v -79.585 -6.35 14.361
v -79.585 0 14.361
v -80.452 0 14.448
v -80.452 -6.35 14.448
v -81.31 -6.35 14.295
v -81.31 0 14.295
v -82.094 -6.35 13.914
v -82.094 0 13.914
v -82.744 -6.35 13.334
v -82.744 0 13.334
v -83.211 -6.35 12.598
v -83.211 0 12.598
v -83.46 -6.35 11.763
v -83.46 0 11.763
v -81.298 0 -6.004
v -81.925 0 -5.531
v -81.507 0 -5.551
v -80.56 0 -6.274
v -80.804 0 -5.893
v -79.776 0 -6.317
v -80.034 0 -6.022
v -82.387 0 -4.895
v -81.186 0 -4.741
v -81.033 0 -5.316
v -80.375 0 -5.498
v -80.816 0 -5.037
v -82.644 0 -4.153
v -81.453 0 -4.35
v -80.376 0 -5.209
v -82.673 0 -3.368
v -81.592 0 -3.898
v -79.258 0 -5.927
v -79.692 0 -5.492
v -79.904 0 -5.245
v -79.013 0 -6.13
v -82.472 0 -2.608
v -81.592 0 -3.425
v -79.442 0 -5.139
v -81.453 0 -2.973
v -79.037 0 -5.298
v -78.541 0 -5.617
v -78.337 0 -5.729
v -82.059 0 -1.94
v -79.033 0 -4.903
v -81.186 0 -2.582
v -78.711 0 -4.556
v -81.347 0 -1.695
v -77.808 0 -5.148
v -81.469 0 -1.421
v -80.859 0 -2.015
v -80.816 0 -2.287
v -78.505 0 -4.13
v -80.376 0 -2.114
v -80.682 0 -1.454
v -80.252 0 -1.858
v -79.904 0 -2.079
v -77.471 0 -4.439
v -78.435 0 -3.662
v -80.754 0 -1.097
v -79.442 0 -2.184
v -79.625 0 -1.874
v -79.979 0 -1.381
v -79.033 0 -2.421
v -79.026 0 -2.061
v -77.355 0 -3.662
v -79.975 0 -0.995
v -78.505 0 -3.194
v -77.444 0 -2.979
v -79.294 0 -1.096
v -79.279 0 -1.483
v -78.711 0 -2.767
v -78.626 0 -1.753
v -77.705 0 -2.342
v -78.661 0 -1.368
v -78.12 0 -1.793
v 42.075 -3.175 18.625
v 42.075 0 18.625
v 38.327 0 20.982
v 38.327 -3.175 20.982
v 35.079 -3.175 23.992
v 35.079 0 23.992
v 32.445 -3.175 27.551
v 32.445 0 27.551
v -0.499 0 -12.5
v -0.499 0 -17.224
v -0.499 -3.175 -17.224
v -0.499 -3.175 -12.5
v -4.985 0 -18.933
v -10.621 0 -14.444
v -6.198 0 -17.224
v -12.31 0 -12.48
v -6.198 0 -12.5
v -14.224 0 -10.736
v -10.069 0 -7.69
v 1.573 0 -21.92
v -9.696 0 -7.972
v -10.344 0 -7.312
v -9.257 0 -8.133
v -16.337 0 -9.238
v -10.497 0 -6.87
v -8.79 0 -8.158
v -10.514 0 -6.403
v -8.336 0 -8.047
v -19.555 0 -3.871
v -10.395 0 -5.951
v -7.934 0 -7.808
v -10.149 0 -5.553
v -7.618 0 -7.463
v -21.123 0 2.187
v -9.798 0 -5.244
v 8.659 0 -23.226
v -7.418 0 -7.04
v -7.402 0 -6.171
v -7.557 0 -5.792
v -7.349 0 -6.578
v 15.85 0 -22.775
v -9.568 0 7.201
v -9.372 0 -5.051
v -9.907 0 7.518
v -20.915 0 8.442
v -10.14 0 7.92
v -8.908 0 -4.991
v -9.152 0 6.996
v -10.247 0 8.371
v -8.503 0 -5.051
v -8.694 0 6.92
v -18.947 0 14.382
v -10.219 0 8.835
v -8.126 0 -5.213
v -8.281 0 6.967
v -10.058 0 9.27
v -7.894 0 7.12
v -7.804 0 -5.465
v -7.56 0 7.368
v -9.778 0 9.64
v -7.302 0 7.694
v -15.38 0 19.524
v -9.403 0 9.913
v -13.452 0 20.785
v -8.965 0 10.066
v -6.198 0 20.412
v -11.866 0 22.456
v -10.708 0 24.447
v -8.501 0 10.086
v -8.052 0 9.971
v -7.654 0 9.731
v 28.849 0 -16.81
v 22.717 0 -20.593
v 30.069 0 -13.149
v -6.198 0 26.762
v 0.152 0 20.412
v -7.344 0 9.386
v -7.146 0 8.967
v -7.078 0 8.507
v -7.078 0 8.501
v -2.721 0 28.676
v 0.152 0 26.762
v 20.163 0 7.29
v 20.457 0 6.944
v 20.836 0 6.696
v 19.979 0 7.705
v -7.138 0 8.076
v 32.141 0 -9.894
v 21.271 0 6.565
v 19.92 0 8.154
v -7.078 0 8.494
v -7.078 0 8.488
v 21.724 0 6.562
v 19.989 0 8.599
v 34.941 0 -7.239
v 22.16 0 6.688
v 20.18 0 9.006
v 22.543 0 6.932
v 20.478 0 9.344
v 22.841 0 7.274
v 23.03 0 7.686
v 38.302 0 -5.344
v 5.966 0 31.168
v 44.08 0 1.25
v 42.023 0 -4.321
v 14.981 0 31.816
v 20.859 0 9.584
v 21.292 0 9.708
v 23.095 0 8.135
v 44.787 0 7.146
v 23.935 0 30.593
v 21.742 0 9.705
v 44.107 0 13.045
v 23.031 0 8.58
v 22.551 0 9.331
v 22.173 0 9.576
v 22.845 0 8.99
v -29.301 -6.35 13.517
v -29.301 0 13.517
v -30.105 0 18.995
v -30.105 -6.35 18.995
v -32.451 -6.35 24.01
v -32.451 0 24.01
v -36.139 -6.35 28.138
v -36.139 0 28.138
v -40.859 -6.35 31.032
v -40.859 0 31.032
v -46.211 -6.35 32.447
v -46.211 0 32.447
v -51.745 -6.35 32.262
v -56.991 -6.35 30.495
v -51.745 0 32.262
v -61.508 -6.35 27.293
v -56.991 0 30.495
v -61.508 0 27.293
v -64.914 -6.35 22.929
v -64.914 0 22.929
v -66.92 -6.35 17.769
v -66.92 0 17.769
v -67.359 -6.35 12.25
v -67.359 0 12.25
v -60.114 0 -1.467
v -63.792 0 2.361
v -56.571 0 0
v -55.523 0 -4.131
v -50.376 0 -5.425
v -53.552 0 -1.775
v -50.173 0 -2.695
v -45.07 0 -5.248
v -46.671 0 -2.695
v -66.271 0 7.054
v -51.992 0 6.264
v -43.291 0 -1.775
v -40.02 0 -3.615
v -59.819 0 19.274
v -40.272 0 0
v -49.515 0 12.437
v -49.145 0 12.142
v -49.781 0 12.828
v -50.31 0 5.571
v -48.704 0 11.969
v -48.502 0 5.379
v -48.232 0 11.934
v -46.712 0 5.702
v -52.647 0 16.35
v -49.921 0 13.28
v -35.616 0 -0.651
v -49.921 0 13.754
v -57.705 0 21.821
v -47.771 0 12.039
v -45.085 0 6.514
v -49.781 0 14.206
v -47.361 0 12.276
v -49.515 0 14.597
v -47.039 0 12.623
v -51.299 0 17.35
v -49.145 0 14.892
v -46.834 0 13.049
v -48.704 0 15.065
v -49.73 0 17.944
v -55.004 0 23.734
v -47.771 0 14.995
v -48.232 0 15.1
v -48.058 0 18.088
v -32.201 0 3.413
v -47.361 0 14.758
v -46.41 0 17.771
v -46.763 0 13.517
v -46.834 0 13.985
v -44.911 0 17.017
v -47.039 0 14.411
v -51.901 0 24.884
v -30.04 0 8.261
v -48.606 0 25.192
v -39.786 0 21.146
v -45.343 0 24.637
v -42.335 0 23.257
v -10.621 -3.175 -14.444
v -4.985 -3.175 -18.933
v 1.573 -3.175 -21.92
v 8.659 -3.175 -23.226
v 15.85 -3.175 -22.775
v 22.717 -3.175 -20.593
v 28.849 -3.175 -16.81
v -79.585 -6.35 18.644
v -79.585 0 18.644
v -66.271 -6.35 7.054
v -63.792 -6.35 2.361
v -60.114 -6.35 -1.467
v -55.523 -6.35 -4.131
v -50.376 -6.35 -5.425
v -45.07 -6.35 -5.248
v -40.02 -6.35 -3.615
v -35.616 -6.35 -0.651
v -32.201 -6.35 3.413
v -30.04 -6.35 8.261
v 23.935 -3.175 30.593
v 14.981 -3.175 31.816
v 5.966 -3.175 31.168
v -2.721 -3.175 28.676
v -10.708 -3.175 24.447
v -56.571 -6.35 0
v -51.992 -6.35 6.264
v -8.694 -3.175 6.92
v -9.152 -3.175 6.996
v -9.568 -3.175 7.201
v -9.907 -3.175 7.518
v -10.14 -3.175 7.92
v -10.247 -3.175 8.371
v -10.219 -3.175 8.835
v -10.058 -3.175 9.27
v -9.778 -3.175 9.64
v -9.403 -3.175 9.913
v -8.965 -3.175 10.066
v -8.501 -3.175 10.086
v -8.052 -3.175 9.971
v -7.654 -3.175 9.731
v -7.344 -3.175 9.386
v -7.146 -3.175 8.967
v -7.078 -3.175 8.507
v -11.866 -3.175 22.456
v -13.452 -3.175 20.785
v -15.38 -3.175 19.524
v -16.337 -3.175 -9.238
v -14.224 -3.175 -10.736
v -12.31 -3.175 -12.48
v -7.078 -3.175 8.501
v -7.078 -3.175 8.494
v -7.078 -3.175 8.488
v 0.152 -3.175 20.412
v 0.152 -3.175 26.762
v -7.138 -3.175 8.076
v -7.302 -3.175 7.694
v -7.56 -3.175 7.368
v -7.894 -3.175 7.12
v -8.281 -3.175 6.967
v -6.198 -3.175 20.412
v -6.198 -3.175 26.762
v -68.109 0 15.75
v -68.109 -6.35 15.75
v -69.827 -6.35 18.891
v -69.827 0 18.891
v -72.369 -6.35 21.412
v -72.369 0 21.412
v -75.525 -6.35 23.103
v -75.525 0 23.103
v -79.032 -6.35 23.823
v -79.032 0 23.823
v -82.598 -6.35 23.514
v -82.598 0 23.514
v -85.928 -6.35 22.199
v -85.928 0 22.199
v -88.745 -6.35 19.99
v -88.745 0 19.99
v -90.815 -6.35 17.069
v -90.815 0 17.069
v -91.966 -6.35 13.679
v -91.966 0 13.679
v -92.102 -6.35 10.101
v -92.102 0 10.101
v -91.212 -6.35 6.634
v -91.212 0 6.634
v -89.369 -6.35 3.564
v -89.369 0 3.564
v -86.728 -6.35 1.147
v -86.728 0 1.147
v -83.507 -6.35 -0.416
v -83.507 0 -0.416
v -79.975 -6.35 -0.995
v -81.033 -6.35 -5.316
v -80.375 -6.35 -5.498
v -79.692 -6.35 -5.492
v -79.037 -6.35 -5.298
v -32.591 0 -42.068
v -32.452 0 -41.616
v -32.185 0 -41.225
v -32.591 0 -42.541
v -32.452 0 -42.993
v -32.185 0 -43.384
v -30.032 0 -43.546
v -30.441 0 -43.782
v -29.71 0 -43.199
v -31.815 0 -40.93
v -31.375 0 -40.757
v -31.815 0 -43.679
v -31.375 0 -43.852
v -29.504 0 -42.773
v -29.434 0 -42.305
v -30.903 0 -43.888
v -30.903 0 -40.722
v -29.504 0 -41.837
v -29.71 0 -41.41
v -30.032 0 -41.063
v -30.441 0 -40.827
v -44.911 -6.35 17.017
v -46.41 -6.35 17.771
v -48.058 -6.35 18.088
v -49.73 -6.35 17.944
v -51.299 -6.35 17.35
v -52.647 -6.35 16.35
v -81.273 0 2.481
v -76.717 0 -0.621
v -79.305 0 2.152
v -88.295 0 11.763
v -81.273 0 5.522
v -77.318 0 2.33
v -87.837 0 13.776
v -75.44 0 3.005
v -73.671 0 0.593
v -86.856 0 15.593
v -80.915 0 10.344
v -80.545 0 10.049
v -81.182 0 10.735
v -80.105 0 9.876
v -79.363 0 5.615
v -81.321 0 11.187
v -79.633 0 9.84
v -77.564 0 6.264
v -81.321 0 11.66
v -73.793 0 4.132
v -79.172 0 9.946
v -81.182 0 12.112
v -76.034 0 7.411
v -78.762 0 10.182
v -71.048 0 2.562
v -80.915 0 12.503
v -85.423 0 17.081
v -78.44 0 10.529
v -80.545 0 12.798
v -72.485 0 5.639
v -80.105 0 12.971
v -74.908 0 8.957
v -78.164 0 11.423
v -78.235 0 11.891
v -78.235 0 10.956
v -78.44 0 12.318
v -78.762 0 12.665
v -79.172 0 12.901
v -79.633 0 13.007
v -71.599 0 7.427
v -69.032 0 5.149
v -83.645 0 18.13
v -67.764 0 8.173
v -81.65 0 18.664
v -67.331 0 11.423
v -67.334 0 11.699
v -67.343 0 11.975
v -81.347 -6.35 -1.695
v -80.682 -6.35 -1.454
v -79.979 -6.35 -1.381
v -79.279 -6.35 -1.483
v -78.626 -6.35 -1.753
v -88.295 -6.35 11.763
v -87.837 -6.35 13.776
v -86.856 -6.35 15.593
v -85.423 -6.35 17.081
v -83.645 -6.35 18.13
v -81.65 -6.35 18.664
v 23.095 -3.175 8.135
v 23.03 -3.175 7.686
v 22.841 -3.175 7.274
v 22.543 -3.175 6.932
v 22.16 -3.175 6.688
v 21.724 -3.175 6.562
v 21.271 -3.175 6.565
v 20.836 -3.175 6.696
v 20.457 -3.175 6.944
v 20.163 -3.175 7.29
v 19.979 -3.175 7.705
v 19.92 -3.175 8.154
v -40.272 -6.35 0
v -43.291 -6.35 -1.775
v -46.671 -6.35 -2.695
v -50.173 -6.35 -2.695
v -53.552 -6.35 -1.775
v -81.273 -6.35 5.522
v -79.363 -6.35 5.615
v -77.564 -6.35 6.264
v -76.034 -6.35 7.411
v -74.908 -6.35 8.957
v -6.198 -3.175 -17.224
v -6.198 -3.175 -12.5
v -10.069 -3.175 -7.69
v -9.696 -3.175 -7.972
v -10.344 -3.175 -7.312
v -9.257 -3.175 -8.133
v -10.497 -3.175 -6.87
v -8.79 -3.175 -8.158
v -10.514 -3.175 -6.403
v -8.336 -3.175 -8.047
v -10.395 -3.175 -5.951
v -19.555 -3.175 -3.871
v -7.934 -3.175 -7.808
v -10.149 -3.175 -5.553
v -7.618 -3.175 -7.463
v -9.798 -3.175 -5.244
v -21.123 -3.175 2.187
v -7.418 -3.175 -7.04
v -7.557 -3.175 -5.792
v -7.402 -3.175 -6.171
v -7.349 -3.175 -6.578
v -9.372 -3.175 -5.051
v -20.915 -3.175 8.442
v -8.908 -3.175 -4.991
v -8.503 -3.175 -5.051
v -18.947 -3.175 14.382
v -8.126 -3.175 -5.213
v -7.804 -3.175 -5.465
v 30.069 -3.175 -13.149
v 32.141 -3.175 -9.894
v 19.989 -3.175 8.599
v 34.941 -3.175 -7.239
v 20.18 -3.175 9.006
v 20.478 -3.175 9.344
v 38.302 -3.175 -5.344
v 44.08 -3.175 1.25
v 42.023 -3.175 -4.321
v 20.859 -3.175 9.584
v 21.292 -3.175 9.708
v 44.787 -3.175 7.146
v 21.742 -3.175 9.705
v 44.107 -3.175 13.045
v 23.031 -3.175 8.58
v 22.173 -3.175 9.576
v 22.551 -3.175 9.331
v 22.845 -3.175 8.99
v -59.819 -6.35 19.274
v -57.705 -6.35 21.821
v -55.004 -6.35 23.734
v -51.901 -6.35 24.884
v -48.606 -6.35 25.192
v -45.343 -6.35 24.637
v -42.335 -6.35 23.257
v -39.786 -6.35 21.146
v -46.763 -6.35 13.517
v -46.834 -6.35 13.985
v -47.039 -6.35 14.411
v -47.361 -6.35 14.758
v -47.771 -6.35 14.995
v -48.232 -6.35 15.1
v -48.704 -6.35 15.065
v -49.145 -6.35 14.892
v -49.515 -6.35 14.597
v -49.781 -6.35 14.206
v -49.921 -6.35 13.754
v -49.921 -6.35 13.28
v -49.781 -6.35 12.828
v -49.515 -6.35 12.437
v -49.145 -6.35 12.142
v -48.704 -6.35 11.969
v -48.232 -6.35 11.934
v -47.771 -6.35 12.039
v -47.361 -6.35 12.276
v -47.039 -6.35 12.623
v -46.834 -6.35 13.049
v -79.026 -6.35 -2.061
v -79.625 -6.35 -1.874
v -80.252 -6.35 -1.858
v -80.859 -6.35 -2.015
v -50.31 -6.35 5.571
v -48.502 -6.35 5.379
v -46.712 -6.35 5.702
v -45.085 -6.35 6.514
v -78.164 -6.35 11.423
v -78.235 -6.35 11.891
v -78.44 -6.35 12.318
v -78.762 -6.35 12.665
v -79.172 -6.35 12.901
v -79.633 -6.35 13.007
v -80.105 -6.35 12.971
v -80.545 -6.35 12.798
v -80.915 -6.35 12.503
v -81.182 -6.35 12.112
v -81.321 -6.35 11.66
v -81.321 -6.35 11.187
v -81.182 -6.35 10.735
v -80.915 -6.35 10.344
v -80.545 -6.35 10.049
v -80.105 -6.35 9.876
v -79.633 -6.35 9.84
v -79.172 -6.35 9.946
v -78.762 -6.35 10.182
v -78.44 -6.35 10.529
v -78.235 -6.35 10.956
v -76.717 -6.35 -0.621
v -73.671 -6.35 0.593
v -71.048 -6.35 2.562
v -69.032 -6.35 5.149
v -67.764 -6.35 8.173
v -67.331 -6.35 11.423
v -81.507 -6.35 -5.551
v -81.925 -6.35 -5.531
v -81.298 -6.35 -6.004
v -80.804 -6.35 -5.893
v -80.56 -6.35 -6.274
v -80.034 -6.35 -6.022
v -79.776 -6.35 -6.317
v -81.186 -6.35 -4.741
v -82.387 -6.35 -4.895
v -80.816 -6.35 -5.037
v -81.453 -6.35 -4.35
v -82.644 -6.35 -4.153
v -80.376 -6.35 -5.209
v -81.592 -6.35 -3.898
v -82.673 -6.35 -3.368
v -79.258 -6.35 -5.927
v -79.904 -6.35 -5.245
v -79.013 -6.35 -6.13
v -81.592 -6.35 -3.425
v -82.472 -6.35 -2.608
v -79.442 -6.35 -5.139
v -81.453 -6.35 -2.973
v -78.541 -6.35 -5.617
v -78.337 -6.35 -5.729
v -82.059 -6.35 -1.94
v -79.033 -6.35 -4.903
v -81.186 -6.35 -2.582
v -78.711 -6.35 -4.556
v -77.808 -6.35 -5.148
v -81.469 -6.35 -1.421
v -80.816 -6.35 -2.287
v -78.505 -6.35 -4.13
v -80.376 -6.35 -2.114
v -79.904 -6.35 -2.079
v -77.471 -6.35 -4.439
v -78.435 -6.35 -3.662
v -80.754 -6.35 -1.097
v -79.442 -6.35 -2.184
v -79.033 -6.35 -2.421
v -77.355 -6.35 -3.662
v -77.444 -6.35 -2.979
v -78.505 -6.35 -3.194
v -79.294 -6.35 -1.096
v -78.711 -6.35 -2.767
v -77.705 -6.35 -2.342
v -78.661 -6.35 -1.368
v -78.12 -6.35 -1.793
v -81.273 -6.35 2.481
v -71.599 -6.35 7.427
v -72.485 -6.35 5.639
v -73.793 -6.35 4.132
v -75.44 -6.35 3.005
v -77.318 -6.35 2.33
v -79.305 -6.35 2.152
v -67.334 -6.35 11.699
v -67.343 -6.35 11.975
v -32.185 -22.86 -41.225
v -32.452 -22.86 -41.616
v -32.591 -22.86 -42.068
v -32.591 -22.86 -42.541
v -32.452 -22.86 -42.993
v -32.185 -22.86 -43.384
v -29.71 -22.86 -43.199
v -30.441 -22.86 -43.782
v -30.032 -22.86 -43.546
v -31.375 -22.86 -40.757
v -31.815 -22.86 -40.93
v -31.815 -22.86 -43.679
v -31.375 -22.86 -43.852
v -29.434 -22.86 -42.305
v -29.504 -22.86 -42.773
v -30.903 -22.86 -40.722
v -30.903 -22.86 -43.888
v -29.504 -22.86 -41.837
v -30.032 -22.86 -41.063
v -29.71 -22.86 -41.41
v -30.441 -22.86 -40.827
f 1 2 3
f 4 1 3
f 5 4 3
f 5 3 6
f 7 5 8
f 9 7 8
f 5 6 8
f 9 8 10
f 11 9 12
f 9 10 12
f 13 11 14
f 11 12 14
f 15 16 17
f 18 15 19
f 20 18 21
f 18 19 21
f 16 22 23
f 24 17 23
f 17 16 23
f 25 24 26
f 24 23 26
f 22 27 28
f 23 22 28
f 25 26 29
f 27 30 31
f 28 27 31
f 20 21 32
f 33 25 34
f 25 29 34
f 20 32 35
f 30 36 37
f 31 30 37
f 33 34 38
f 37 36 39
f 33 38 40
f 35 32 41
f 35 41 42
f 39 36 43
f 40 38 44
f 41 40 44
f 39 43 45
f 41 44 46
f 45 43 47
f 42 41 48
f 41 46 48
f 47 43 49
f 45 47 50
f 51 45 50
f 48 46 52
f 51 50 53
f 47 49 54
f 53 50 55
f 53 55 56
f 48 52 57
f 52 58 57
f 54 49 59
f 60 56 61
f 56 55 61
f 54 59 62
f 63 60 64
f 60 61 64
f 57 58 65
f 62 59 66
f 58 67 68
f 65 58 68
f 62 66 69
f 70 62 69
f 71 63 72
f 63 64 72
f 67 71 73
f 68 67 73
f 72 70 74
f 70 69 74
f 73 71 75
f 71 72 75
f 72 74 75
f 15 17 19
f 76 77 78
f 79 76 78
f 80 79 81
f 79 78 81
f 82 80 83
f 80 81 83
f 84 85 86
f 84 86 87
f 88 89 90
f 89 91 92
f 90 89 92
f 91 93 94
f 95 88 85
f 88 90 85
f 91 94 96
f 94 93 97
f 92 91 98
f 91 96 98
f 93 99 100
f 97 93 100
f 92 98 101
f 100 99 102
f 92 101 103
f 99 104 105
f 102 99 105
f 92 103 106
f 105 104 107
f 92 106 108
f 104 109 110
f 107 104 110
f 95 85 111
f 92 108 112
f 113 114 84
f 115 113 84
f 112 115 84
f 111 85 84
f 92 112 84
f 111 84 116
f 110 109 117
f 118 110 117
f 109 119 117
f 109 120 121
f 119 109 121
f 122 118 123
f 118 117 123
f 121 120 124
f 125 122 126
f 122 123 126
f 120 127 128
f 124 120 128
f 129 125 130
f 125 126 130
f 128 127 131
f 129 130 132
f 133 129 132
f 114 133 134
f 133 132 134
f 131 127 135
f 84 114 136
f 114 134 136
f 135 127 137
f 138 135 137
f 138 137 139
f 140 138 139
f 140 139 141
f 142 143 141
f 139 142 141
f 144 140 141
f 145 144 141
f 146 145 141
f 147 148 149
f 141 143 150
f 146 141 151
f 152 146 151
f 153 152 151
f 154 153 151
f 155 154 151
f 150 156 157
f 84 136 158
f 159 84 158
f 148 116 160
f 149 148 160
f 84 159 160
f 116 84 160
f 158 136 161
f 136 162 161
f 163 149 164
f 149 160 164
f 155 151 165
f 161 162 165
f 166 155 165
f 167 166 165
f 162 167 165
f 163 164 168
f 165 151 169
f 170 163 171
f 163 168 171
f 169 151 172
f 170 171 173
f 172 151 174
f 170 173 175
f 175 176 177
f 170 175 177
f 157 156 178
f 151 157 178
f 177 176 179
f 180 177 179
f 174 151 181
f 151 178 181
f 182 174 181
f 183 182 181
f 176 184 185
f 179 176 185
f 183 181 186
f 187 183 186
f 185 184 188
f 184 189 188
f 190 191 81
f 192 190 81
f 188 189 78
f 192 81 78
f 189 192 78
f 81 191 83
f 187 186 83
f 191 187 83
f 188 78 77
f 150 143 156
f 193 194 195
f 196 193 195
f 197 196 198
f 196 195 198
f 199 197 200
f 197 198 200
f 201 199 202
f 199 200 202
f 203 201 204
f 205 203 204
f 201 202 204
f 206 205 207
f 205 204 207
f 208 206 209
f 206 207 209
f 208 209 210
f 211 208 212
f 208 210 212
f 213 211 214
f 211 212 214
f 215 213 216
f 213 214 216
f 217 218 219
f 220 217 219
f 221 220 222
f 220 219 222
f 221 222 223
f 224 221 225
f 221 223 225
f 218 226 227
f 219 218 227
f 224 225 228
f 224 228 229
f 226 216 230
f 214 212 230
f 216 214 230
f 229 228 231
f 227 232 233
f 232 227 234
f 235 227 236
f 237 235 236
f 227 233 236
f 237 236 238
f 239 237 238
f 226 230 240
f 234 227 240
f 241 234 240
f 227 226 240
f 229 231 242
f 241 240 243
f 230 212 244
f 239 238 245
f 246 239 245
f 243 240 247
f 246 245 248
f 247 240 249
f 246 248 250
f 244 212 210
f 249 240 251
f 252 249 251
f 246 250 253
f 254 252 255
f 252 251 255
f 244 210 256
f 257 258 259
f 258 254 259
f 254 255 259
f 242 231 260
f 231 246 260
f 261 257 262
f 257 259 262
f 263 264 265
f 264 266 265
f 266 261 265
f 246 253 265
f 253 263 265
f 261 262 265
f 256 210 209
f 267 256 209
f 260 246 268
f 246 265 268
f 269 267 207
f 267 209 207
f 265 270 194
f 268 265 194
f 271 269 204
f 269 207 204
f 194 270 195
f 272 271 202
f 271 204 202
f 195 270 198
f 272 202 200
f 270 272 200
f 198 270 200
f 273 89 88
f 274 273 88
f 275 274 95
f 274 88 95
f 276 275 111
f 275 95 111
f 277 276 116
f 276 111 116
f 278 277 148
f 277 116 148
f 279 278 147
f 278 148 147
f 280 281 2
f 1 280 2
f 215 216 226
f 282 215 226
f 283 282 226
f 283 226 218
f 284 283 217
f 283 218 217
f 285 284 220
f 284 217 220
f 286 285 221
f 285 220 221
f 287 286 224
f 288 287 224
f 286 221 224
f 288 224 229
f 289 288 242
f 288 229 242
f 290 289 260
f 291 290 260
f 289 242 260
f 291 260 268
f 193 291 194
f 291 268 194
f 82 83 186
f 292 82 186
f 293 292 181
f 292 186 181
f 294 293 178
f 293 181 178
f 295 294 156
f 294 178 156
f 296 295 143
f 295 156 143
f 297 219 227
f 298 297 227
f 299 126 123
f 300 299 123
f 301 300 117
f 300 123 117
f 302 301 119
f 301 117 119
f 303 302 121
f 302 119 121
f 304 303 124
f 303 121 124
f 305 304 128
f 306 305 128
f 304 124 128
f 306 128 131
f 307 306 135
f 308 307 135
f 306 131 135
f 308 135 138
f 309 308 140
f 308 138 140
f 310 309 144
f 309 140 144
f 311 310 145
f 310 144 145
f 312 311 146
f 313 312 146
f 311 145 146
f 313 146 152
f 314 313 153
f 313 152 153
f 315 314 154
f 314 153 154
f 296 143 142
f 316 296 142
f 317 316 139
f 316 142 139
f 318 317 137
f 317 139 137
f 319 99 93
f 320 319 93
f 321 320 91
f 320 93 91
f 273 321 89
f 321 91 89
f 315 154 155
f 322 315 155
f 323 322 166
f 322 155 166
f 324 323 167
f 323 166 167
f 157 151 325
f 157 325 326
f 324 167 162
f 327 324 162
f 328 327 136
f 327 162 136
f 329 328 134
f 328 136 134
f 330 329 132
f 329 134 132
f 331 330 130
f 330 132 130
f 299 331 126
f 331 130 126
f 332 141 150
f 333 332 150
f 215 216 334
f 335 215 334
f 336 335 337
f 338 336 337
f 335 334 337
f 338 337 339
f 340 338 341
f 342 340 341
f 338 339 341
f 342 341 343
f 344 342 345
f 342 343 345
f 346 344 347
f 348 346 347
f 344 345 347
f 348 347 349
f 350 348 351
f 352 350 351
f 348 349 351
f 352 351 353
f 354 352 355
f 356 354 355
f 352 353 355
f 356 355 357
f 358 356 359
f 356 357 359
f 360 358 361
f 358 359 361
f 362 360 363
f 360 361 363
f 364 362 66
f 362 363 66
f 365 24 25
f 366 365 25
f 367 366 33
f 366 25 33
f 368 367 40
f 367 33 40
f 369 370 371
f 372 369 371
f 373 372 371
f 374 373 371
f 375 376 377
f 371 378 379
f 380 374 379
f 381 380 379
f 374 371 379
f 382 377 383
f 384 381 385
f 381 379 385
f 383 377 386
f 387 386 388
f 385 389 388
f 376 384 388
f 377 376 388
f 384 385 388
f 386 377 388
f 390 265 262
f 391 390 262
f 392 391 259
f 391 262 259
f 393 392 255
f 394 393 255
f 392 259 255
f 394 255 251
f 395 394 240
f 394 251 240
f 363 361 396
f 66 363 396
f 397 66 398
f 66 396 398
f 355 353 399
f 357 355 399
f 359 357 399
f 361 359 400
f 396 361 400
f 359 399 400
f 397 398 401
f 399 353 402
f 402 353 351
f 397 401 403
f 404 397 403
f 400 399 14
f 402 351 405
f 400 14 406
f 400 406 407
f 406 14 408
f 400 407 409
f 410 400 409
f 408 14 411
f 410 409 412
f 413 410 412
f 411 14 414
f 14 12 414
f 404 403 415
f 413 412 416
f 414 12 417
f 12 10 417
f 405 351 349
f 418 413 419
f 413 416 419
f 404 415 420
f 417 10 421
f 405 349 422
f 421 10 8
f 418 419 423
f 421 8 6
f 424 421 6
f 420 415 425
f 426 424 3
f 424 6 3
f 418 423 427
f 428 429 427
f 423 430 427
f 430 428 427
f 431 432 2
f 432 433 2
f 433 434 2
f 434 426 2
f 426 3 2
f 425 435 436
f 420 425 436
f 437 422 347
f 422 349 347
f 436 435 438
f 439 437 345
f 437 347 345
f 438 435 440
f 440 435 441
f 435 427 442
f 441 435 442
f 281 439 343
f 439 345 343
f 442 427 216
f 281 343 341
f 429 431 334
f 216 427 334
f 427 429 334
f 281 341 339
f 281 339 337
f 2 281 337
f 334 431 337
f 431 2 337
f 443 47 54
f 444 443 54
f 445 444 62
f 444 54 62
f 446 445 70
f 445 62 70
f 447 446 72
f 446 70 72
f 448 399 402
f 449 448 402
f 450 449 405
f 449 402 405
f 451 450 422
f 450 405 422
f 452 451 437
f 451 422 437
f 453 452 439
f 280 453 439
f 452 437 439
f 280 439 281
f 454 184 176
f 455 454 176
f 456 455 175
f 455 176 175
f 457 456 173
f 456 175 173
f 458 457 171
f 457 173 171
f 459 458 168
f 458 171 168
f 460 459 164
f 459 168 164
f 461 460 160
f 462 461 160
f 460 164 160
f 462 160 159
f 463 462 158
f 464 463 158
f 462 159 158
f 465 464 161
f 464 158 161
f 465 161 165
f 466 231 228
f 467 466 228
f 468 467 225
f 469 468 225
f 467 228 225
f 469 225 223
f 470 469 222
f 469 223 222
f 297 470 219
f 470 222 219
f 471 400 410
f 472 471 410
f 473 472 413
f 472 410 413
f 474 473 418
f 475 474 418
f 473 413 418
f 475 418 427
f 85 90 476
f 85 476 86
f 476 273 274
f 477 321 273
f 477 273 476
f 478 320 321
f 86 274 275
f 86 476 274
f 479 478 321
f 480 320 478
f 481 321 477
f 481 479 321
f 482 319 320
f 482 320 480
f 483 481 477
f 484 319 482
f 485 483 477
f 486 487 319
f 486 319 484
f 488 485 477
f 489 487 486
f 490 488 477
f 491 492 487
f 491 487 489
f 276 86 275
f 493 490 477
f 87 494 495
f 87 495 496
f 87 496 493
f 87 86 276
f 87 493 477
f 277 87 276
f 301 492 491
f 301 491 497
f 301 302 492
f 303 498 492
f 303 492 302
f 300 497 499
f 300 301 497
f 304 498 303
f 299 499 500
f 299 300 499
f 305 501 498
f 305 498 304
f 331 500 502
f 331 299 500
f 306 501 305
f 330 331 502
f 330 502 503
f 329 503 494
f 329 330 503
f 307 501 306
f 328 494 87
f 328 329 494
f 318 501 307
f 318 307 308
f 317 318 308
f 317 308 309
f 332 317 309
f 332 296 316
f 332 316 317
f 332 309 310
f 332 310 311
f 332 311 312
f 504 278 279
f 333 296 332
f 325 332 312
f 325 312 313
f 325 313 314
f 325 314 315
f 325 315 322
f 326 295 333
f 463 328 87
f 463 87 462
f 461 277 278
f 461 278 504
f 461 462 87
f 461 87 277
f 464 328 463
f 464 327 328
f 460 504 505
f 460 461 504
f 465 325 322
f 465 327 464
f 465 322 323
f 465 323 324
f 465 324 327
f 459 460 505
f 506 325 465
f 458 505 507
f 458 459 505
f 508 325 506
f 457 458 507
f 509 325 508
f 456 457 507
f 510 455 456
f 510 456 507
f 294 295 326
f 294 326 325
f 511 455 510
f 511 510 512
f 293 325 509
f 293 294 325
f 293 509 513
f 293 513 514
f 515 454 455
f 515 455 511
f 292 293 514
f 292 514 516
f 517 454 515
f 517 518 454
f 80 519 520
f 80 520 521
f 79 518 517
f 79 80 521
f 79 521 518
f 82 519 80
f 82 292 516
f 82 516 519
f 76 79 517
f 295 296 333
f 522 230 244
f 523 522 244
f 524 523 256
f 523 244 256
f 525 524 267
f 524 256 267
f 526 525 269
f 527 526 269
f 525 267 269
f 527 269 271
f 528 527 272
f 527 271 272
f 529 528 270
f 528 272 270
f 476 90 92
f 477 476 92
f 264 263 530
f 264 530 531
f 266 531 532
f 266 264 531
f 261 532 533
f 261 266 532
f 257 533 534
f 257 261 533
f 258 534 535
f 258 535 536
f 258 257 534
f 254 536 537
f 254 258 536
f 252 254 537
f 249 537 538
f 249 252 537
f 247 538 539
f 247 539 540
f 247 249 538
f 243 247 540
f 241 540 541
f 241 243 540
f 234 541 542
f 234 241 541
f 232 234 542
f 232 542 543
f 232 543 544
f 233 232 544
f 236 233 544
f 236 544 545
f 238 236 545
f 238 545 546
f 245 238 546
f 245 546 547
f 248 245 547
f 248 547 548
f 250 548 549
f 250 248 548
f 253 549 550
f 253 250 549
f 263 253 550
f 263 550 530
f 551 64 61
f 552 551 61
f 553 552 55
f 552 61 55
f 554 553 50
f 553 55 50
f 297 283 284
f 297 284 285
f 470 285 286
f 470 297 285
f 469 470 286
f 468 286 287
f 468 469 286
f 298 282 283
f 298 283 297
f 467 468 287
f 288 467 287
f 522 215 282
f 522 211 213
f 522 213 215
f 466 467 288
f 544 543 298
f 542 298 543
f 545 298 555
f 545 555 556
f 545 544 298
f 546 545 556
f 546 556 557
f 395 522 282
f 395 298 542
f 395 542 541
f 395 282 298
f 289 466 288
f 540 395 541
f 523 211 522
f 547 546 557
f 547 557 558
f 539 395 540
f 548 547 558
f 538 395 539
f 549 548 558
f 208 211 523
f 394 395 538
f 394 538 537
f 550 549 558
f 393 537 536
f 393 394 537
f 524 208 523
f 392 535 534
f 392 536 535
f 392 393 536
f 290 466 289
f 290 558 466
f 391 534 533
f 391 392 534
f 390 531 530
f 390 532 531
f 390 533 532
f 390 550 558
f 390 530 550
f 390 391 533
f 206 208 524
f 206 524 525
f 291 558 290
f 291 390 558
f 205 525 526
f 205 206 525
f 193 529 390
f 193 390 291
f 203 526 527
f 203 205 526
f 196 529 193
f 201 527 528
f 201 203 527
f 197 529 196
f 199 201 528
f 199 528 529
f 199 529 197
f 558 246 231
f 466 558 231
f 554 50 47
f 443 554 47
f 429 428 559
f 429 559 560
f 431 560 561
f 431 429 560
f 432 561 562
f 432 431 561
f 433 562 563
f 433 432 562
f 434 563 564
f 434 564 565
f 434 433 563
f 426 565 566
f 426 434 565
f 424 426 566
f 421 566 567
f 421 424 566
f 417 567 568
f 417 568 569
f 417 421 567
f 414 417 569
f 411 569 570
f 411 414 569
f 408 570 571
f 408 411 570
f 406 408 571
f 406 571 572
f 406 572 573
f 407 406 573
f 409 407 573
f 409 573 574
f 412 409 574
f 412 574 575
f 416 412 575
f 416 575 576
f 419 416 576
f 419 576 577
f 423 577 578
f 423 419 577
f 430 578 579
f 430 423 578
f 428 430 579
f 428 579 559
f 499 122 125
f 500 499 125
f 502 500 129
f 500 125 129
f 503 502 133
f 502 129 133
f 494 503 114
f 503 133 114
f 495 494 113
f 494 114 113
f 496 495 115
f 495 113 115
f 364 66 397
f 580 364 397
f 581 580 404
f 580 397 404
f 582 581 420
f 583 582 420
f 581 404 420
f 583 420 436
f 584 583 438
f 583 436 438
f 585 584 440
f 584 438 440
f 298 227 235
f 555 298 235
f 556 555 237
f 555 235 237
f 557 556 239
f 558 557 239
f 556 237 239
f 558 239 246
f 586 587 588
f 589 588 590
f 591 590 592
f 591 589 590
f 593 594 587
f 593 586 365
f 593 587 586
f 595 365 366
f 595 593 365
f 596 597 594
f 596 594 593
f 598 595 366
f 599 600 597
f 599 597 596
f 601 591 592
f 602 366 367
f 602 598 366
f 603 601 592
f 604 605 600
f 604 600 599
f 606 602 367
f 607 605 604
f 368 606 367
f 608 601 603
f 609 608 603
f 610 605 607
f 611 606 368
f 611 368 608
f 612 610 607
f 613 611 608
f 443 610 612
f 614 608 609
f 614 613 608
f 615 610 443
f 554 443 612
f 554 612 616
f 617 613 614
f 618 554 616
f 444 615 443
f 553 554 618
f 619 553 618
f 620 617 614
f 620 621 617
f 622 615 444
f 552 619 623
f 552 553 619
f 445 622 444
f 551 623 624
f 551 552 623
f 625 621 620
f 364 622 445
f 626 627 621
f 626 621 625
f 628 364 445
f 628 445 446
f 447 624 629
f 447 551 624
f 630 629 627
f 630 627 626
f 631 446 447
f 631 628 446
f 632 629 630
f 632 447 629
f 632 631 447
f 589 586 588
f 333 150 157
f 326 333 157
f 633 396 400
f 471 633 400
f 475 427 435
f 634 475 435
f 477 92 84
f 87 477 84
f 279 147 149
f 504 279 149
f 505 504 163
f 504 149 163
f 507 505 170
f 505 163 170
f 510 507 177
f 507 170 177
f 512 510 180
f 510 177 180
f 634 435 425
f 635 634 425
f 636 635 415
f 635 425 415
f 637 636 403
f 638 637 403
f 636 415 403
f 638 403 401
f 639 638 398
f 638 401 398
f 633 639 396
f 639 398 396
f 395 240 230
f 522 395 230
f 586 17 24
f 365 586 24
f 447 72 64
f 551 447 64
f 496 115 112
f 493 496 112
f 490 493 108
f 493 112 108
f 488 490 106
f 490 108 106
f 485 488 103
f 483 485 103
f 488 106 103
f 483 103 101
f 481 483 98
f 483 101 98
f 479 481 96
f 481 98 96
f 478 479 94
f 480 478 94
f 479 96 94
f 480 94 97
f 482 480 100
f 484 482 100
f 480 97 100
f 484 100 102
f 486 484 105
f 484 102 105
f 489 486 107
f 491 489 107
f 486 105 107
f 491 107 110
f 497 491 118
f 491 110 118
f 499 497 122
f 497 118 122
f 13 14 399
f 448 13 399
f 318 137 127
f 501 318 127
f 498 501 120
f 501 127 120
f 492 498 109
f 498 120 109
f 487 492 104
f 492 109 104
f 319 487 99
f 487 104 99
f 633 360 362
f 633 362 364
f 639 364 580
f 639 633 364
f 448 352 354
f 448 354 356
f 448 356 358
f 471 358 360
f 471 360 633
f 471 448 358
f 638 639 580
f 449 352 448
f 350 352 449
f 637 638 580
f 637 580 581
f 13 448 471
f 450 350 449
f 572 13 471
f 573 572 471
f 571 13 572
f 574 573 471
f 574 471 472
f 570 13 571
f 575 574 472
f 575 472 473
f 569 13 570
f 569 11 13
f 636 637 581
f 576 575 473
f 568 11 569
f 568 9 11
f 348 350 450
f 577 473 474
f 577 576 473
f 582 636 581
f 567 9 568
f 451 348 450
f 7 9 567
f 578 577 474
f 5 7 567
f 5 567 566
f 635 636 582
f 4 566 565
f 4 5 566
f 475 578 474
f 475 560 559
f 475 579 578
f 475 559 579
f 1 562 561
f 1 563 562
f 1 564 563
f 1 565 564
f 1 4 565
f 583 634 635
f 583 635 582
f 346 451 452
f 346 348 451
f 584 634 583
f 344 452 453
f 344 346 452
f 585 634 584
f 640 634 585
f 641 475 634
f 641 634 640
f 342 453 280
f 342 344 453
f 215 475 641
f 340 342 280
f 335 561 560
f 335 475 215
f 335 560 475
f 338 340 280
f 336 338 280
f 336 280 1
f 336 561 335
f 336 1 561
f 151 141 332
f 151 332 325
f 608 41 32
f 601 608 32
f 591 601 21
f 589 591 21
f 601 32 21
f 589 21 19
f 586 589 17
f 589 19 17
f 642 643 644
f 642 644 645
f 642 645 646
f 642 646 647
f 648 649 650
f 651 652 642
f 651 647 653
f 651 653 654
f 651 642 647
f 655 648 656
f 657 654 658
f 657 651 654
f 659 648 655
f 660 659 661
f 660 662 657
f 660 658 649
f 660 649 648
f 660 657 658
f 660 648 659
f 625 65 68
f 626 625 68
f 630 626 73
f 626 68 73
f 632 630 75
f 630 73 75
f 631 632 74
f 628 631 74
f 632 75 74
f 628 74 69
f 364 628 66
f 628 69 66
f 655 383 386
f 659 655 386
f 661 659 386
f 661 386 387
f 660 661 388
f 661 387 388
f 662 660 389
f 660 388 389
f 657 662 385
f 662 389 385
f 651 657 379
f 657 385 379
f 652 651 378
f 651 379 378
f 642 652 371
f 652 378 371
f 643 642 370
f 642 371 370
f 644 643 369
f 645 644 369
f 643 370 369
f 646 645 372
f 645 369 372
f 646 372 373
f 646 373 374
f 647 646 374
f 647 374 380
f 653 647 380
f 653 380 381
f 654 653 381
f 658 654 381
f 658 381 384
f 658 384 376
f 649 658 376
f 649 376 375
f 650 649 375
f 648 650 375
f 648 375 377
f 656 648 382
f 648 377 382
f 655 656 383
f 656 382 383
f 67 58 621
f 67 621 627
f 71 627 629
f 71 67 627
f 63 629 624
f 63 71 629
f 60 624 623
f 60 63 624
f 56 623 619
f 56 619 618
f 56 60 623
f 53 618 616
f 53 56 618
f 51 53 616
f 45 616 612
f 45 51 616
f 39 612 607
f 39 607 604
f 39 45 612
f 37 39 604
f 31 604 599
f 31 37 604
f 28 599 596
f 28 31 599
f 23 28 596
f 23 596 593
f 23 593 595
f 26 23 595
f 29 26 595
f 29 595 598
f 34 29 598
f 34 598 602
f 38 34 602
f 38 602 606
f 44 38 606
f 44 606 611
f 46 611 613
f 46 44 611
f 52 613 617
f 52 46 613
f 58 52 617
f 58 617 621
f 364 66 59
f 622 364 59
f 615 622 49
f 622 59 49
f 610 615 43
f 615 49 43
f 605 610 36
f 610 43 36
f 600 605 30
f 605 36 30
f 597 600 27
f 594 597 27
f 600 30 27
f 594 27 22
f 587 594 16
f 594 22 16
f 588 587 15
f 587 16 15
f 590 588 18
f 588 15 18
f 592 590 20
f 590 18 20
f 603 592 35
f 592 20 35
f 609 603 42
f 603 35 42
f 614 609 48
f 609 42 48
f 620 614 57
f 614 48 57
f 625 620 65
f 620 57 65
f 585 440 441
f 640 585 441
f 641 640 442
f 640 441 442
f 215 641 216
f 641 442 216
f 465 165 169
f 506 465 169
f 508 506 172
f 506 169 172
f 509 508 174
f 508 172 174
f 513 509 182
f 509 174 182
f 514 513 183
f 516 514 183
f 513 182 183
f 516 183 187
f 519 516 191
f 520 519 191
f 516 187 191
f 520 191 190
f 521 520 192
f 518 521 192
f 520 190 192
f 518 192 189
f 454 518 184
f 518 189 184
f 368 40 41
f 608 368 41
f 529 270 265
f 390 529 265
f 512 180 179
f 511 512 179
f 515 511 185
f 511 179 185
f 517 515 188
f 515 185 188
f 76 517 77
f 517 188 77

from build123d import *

# Parameters (mm, degrees)
F0_R     = 1.5875
F1_DEPTH = 6.35
F0_W     = 5.6992975482
F0_H     = 4.7241855249
F0_W_2   = 6.35
F0_H_2   = 6.35
F2_DEPTH = 3.175
F3_DEPTH = 22.86


with BuildPart() as f1:
    # F0 (on Front) → F1 (new body)
    with BuildSketch(Plane.XZ):
        with BuildLine():
            ThreePointArc((-67.3585994082, 12.2497619586), (-47.7167899216, -5.5223650535), (-29.3008009861, 13.5170816288))
            ThreePointArc((-29.3008009861, 13.5170816289), (-48.9848120507, 32.5565283112), (-67.3585994082, 12.2497619586))
        make_face()
        with BuildLine():
            Line((-56.5712973475, 0), (-51.9921034575, 6.2635407752))
            ThreePointArc((-51.9921034575, 6.2635407752), (-48.5019898602, 5.3787178579), (-45.0852625072, 6.5144021064))
            Line((-45.0852625072, 6.5144021064), (-40.272153914, 0))
            ThreePointArc((-40.272153914, 0), (-48.4217256308, -2.8116386768), (-56.5712973475, 0))
        make_face(mode=Mode.SUBTRACT)
        with Locations((-48.3508009861, 13.5170816289)):
            Circle(F0_R, mode=Mode.SUBTRACT)
        with BuildLine():
            Line((-52.6470765471, 16.3498036563), (-59.8185919225, 19.2743316293))
            ThreePointArc((-59.8185919225, 19.2743316293), (-50.2635926632, 25.1457315984), (-39.7862121463, 21.1462508887))
            Line((-39.7862121463, 21.1462508887), (-44.9106283486, 17.0165207237))
            ThreePointArc((-44.9106283486, 17.0165207237), (-48.8986942592, 18.0737820053), (-52.6470765471, 16.3498036563))
        make_face(mode=Mode.SUBTRACT)
    extrude(amount=F1_DEPTH)


with BuildPart() as f1b:
    # F0 (on Front) → F1, piece 2 (new body)
    with BuildSketch(Plane.XZ):
        with BuildLine():
            ThreePointArc((-67.3310839693, 11.423469383), (-67.337964735, 11.8368446725), (-67.3585994082, 12.2497619586))
            ThreePointArc((-67.3585994082, 12.2497619586), (-88.7453012362, 19.9900412071), (-79.9745823175, -0.9951304046))
            ThreePointArc((-79.9745823175, -0.9951304046), (-71.0481567207, 2.562322855), (-67.3310839693, 11.423469383))
        make_face()
        with BuildLine():
            Line((-81.2733918428, 2.4807630107), (-81.2733918428, 5.5222734809))
            ThreePointArc((-81.2733918428, 5.5222734809), (-77.5641064708, 6.2635407752), (-74.9084055424, 8.9571494609))
            Line((-74.9084055424, 8.9571494609), (-71.5991035104, 7.4266553856))
            ThreePointArc((-71.5991035104, 7.4266553856), (-75.4399710481, 3.004967367), (-81.2733918428, 2.4807630107))
        make_face(mode=Mode.SUBTRACT)
        with Locations((-79.7516839693, 11.423469383)):
            Circle(F0_R, mode=Mode.SUBTRACT)
        with BuildLine():
            Line((-83.4595635533, 11.7629636079), (-88.2952660322, 11.7629636079))
            ThreePointArc((-88.2952660322, 11.7629636079), (-85.4232493823, 17.0805786516), (-79.5853286982, 18.6439696699))
            Line((-79.5853286982, 18.6439696699), (-79.5853286982, 14.361333102))
            ThreePointArc((-79.5853286982, 14.361333102), (-82.0937953984, 13.9140446197), (-83.4595635533, 11.7629636079))
        make_face(mode=Mode.SUBTRACT)
    extrude(amount=F1_DEPTH)


with BuildPart() as f1c:
    # F0 (on Front) → F1, piece 3 (new body)
    with BuildSketch(Plane.XZ):
        with BuildLine():
            ThreePointArc((-77.3554439497, -3.6617009108), (-78.1197437667, -1.792845375), (-79.9745823175, -0.9951304046))
            ThreePointArc((-79.9745823175, -0.9951304046), (-81.9251441328, -5.5305564465), (-77.3554439497, -3.6617009108))
        make_face()
        with BuildLine():
            Line((-81.5068259835, -5.5508497171), (-81.0334607959, -5.3159161471))
            ThreePointArc((-81.0334607959, -5.3159161471), (-80.0334453121, -5.5187104426), (-79.0372937918, -5.2977157757))
            Line((-79.0372937918, -5.2977157757), (-78.5414129496, -5.6172092445))
            ThreePointArc((-78.5414129496, -5.6172092445), (-80.0339176232, -6.0218804194), (-81.5068259835, -5.5508497171))
        make_face(mode=Mode.SUBTRACT)
        with Locations((-80.0224439497, -3.6617009108)):
            Circle(F0_R, mode=Mode.SUBTRACT)
        with BuildLine():
            Line((-80.8590352535, -2.0147818141), (-81.3467651606, -1.6953132581))
            ThreePointArc((-81.3467651606, -1.6953132581), (-79.979023866, -1.3814665574), (-78.6257460713, -1.752755139))
            Line((-78.6257460713, -1.752755139), (-79.0260359645, -2.0612876397))
            ThreePointArc((-79.0260359645, -2.0612876397), (-79.9376072444, -1.8437861853), (-80.8590352535, -2.0147818141))
        make_face(mode=Mode.SUBTRACT)
    extrude(amount=F1_DEPTH)


with BuildPart() as f2:
    # F0 (on Front) → F2 (new body)
    with BuildSketch(Plane.XZ):
        with BuildLine():
            ThreePointArc((-16.336656812, -9.2380635097), (-13.2402074156, -11.5790459327), (-10.621478104, -14.4444349746))
            ThreePointArc((-10.621478104, -14.4444349746), (8.6585009426, -23.2264616755), (28.849388551, -16.8101042509))
            ThreePointArc((28.849388551, -16.8101042509), (33.4595478462, -8.4807166781), (42.0227806245, -4.3209918733))
            ThreePointArc((42.0227806245, -4.3209918733), (44.7871177092, 7.1458658353), (42.0750837904, 18.6252062889))
            ThreePointArc((42.0750837904, 18.6252062889), (36.6327610513, 22.4112446581), (32.4451126099, 27.5509493053))
            ThreePointArc((32.4451126099, 27.5509493053), (10.4566000096, 31.7261104258), (-10.7079961448, 24.4469259678))
            ThreePointArc((-10.7079961448, 24.4469259678), (-12.6105462262, 21.574072454), (-15.3801280942, 19.5240967466))
            ThreePointArc((-15.3801280942, 19.5240967466), (-21.2439973275, 5.3221229748), (-16.336656812, -9.2380635097))
        make_face()
        with BuildLine():
            ThreePointArc((-4.9677237983, -6.5777782366), (-11.76787287, -9.3588132704), (-8.8652511603, -2.6096673639))
            ThreePointArc((-8.8652511603, -2.6096673639), (-6.1050747266, -3.7967432029), (-4.9677237983, -6.5777782366))
        make_face(mode=Mode.SUBTRACT)
        with Locations((-3.3481849043, -14.8623904295)):
            Rectangle(F0_W, F0_H, mode=Mode.SUBTRACT)
        with BuildLine():
            ThreePointArc((0.0655361821, 8.5073920572), (0.0653697487, 8.4534817934), (0.0648704546, 8.3995735849))
            ThreePointArc((0.0648704546, 8.3995735849), (-2.5860142121, 2.2406561232), (-8.8224036214, -0.2224518629))
            ThreePointArc((-8.8224036214, -0.2224518629), (-14.7839908922, 14.736470015), (0.0655361821, 8.5073920572))
        make_face(mode=Mode.SUBTRACT)
        with BuildLine():
            ThreePointArc((3.2586769194, 8.3601316274), (21.6198676811, 26.3843235408), (39.7570854279, 8.134771417))
            ThreePointArc((39.7570854279, 8.134771417), (21.3945031748, -10.1147807068), (3.2586769194, 8.3601316274))
        make_face(mode=Mode.SUBTRACT)
        with Locations((-3.0228336784, 23.5873528674)):
            Rectangle(F0_W_2, F0_H_2, mode=Mode.SUBTRACT)
        with BuildLine():
            ThreePointArc((3.2586769194, 8.3601316274), (21.3945031748, -10.1147807068), (39.7570854279, 8.134771417))
            ThreePointArc((39.7570854279, 8.134771417), (21.6198676811, 26.3843235408), (3.2586769194, 8.3601316274))
        make_face()
        with BuildLine():
            ThreePointArc((23.0946854279, 8.134771417), (21.4973835618, 6.5473016776), (19.9198064693, 8.1543747756))
            ThreePointArc((19.9198064693, 8.1543747756), (21.5169872941, 9.7222411564), (23.0946854279, 8.134771417))
        make_face(mode=Mode.SUBTRACT)
        with BuildLine():
            Line((-7.0783348592, 8.4877886986), (0.0648704546, 8.3995735849))
            ThreePointArc((0.0648704546, 8.3995735849), (0.0653697487, 8.4534817934), (0.0655361821, 8.5073920572))
            ThreePointArc((0.0655361821, 8.5073920572), (-14.7839908922, 14.736470015), (-8.8224036214, -0.2224518629))
            Line((-8.8224036214, -0.2224518629), (-8.6942028731, 6.9201477081))
            ThreePointArc((-8.6942028731, 6.9201477081), (-9.7781278314, 9.6399516859), (-7.0782138179, 8.5073920572))
            ThreePointArc((-7.0782138179, 8.5073920572), (-7.0782440785, 8.497590191), (-7.0783348592, 8.4877886986))
        make_face()
        with BuildLine():
            ThreePointArc((-8.8224036214, -0.2224518629), (-2.5860142121, 2.2406561232), (0.0648704546, 8.3995735849))
            Line((0.0648704546, 8.3995735849), (-7.0783348592, 8.4877886986))
            ThreePointArc((-7.0783348592, 8.4877886986), (-7.5603138895, 7.3679855237), (-8.6942028731, 6.9201477081))
            Line((-8.6942028731, 6.9201477081), (-8.8224036214, -0.2224518629))
        make_face()
        with BuildLine():
            ThreePointArc((-4.9677237983, -6.5777782366), (-6.1050747266, -3.7967432029), (-8.8652511603, -2.6096673639))
            ThreePointArc((-8.8652511603, -2.6096673639), (-11.76787287, -9.3588132704), (-4.9677237983, -6.5777782366))
        make_face()
        with BuildLine():
            ThreePointArc((-7.3489737983, -6.5777782366), (-10.069033427, -7.6901922502), (-8.9079847431, -4.9905338875))
            ThreePointArc((-8.9079847431, -4.9905338875), (-7.8039141696, -5.4653642231), (-7.3489737983, -6.5777782366))
        make_face(mode=Mode.SUBTRACT)
    extrude(amount=F2_DEPTH)


with BuildPart() as f3:
    # F0 (on Front) → F3 (new body)
    with BuildSketch(Plane.XZ):
        with Locations((-31.0214497149, -42.3045940697)):
            Circle(F0_R)
    extrude(amount=F3_DEPTH)


solid = Compound([f1.part, f1b.part, f1c.part, f2.part, f3.part])
